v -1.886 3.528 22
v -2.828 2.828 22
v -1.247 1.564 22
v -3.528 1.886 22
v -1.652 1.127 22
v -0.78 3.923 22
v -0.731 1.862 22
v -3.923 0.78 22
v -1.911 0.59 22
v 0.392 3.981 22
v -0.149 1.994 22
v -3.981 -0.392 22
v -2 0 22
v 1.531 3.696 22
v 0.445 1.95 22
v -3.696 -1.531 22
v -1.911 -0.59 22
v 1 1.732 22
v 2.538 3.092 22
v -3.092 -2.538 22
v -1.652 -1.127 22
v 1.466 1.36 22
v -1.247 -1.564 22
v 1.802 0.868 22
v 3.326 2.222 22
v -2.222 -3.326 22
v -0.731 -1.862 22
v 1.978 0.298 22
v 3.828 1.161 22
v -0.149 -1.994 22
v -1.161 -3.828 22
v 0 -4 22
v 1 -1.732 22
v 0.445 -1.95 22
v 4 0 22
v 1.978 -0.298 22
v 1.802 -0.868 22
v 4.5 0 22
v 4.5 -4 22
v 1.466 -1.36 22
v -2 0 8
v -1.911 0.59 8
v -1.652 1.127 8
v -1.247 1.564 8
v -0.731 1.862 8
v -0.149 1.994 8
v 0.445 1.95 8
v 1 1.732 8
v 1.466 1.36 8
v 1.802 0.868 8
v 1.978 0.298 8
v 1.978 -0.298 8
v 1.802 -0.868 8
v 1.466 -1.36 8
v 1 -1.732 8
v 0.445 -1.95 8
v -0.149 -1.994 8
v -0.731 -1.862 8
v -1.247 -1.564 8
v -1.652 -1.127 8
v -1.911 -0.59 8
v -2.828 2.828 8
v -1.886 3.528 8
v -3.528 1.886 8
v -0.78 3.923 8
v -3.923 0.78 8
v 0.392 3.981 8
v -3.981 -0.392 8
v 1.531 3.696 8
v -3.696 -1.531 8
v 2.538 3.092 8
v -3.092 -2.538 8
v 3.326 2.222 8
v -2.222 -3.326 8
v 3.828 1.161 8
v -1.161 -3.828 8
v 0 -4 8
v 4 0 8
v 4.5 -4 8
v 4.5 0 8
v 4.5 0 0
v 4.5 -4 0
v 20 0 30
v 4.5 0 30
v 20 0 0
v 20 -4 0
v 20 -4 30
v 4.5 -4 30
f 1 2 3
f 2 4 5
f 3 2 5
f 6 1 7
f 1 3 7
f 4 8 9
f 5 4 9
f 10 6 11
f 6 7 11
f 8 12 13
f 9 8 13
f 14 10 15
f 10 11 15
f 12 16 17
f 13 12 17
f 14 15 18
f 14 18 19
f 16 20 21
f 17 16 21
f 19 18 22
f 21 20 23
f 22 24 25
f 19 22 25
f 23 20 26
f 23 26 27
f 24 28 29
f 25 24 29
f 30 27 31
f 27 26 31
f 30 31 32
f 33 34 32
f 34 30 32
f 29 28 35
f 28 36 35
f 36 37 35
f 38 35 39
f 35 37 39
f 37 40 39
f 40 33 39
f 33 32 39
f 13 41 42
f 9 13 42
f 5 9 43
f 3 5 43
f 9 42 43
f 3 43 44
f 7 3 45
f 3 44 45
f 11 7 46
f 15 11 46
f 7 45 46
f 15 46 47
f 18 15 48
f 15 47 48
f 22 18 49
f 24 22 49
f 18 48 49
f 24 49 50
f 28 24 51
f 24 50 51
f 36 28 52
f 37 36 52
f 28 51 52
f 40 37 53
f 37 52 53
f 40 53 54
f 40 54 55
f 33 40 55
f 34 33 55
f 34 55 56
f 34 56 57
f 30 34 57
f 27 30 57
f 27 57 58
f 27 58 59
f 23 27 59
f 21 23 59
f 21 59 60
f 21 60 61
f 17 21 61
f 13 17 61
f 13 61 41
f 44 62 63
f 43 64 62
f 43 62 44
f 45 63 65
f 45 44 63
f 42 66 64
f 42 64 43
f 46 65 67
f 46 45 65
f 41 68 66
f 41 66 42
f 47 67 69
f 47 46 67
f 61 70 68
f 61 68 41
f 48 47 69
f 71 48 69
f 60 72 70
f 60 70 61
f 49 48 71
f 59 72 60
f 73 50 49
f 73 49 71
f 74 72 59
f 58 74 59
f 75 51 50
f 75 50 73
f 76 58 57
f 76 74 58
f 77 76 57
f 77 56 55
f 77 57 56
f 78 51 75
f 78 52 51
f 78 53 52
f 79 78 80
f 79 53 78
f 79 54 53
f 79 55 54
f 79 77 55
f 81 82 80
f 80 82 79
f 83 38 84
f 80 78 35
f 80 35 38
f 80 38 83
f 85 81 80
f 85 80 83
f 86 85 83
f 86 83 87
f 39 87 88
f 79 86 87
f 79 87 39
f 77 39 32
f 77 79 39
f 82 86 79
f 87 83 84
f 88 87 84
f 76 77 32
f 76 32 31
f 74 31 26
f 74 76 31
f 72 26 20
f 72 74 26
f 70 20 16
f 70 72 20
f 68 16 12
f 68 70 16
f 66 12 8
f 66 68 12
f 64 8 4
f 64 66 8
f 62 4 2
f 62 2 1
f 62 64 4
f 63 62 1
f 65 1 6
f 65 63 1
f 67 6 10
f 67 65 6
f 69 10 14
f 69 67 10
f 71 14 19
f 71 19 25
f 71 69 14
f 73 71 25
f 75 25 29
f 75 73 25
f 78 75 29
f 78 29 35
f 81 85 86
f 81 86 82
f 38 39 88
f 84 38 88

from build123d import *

# Parameters (mm, degrees)
EXTRUDE_1_DEPTH     = 30
SKETCH_2_W          = 9
SKETCH_2_H          = 8.937793365
SKETCH_2_H_2        = 10.067856953
CUT_EXTRUDE_1_DEPTH = 15
SKETCH_3_R          = 2
CUT_EXTRUDE_2_DEPTH = 32


with BuildPart() as part:
    # 草图1 → 凸台-拉伸1 (new body)
    with BuildSketch(Plane.XY):
        with BuildLine():
            Line((4, 0), (20, 0))
            Line((20, 0), (20, -4))
            Line((20, -4), (0, -4))
            ThreePointArc((0, -4), (-2.828427125, 2.828427125), (4, 0))
        make_face()
    extrude(amount=EXTRUDE_1_DEPTH)

    # 草图2 → 切除-拉伸1 (cut)
    with BuildSketch(Plane.XZ.offset(4)):
        with Locations((0, 26.468896683)):
            Rectangle(SKETCH_2_W, SKETCH_2_H)
        with Locations((0, 2.966071524)):
            Rectangle(SKETCH_2_W, SKETCH_2_H_2)
    extrude(amount=-CUT_EXTRUDE_1_DEPTH, mode=Mode.SUBTRACT)

    # 草图3 → 切除-拉伸2 (cut)
    with BuildSketch(Plane(origin=(0, 0, 0), x_dir=(-1, 0, 0), z_dir=(0, 0, -1))):
        Circle(SKETCH_3_R)
    extrude(amount=-CUT_EXTRUDE_2_DEPTH, mode=Mode.SUBTRACT)


solid = part.part
